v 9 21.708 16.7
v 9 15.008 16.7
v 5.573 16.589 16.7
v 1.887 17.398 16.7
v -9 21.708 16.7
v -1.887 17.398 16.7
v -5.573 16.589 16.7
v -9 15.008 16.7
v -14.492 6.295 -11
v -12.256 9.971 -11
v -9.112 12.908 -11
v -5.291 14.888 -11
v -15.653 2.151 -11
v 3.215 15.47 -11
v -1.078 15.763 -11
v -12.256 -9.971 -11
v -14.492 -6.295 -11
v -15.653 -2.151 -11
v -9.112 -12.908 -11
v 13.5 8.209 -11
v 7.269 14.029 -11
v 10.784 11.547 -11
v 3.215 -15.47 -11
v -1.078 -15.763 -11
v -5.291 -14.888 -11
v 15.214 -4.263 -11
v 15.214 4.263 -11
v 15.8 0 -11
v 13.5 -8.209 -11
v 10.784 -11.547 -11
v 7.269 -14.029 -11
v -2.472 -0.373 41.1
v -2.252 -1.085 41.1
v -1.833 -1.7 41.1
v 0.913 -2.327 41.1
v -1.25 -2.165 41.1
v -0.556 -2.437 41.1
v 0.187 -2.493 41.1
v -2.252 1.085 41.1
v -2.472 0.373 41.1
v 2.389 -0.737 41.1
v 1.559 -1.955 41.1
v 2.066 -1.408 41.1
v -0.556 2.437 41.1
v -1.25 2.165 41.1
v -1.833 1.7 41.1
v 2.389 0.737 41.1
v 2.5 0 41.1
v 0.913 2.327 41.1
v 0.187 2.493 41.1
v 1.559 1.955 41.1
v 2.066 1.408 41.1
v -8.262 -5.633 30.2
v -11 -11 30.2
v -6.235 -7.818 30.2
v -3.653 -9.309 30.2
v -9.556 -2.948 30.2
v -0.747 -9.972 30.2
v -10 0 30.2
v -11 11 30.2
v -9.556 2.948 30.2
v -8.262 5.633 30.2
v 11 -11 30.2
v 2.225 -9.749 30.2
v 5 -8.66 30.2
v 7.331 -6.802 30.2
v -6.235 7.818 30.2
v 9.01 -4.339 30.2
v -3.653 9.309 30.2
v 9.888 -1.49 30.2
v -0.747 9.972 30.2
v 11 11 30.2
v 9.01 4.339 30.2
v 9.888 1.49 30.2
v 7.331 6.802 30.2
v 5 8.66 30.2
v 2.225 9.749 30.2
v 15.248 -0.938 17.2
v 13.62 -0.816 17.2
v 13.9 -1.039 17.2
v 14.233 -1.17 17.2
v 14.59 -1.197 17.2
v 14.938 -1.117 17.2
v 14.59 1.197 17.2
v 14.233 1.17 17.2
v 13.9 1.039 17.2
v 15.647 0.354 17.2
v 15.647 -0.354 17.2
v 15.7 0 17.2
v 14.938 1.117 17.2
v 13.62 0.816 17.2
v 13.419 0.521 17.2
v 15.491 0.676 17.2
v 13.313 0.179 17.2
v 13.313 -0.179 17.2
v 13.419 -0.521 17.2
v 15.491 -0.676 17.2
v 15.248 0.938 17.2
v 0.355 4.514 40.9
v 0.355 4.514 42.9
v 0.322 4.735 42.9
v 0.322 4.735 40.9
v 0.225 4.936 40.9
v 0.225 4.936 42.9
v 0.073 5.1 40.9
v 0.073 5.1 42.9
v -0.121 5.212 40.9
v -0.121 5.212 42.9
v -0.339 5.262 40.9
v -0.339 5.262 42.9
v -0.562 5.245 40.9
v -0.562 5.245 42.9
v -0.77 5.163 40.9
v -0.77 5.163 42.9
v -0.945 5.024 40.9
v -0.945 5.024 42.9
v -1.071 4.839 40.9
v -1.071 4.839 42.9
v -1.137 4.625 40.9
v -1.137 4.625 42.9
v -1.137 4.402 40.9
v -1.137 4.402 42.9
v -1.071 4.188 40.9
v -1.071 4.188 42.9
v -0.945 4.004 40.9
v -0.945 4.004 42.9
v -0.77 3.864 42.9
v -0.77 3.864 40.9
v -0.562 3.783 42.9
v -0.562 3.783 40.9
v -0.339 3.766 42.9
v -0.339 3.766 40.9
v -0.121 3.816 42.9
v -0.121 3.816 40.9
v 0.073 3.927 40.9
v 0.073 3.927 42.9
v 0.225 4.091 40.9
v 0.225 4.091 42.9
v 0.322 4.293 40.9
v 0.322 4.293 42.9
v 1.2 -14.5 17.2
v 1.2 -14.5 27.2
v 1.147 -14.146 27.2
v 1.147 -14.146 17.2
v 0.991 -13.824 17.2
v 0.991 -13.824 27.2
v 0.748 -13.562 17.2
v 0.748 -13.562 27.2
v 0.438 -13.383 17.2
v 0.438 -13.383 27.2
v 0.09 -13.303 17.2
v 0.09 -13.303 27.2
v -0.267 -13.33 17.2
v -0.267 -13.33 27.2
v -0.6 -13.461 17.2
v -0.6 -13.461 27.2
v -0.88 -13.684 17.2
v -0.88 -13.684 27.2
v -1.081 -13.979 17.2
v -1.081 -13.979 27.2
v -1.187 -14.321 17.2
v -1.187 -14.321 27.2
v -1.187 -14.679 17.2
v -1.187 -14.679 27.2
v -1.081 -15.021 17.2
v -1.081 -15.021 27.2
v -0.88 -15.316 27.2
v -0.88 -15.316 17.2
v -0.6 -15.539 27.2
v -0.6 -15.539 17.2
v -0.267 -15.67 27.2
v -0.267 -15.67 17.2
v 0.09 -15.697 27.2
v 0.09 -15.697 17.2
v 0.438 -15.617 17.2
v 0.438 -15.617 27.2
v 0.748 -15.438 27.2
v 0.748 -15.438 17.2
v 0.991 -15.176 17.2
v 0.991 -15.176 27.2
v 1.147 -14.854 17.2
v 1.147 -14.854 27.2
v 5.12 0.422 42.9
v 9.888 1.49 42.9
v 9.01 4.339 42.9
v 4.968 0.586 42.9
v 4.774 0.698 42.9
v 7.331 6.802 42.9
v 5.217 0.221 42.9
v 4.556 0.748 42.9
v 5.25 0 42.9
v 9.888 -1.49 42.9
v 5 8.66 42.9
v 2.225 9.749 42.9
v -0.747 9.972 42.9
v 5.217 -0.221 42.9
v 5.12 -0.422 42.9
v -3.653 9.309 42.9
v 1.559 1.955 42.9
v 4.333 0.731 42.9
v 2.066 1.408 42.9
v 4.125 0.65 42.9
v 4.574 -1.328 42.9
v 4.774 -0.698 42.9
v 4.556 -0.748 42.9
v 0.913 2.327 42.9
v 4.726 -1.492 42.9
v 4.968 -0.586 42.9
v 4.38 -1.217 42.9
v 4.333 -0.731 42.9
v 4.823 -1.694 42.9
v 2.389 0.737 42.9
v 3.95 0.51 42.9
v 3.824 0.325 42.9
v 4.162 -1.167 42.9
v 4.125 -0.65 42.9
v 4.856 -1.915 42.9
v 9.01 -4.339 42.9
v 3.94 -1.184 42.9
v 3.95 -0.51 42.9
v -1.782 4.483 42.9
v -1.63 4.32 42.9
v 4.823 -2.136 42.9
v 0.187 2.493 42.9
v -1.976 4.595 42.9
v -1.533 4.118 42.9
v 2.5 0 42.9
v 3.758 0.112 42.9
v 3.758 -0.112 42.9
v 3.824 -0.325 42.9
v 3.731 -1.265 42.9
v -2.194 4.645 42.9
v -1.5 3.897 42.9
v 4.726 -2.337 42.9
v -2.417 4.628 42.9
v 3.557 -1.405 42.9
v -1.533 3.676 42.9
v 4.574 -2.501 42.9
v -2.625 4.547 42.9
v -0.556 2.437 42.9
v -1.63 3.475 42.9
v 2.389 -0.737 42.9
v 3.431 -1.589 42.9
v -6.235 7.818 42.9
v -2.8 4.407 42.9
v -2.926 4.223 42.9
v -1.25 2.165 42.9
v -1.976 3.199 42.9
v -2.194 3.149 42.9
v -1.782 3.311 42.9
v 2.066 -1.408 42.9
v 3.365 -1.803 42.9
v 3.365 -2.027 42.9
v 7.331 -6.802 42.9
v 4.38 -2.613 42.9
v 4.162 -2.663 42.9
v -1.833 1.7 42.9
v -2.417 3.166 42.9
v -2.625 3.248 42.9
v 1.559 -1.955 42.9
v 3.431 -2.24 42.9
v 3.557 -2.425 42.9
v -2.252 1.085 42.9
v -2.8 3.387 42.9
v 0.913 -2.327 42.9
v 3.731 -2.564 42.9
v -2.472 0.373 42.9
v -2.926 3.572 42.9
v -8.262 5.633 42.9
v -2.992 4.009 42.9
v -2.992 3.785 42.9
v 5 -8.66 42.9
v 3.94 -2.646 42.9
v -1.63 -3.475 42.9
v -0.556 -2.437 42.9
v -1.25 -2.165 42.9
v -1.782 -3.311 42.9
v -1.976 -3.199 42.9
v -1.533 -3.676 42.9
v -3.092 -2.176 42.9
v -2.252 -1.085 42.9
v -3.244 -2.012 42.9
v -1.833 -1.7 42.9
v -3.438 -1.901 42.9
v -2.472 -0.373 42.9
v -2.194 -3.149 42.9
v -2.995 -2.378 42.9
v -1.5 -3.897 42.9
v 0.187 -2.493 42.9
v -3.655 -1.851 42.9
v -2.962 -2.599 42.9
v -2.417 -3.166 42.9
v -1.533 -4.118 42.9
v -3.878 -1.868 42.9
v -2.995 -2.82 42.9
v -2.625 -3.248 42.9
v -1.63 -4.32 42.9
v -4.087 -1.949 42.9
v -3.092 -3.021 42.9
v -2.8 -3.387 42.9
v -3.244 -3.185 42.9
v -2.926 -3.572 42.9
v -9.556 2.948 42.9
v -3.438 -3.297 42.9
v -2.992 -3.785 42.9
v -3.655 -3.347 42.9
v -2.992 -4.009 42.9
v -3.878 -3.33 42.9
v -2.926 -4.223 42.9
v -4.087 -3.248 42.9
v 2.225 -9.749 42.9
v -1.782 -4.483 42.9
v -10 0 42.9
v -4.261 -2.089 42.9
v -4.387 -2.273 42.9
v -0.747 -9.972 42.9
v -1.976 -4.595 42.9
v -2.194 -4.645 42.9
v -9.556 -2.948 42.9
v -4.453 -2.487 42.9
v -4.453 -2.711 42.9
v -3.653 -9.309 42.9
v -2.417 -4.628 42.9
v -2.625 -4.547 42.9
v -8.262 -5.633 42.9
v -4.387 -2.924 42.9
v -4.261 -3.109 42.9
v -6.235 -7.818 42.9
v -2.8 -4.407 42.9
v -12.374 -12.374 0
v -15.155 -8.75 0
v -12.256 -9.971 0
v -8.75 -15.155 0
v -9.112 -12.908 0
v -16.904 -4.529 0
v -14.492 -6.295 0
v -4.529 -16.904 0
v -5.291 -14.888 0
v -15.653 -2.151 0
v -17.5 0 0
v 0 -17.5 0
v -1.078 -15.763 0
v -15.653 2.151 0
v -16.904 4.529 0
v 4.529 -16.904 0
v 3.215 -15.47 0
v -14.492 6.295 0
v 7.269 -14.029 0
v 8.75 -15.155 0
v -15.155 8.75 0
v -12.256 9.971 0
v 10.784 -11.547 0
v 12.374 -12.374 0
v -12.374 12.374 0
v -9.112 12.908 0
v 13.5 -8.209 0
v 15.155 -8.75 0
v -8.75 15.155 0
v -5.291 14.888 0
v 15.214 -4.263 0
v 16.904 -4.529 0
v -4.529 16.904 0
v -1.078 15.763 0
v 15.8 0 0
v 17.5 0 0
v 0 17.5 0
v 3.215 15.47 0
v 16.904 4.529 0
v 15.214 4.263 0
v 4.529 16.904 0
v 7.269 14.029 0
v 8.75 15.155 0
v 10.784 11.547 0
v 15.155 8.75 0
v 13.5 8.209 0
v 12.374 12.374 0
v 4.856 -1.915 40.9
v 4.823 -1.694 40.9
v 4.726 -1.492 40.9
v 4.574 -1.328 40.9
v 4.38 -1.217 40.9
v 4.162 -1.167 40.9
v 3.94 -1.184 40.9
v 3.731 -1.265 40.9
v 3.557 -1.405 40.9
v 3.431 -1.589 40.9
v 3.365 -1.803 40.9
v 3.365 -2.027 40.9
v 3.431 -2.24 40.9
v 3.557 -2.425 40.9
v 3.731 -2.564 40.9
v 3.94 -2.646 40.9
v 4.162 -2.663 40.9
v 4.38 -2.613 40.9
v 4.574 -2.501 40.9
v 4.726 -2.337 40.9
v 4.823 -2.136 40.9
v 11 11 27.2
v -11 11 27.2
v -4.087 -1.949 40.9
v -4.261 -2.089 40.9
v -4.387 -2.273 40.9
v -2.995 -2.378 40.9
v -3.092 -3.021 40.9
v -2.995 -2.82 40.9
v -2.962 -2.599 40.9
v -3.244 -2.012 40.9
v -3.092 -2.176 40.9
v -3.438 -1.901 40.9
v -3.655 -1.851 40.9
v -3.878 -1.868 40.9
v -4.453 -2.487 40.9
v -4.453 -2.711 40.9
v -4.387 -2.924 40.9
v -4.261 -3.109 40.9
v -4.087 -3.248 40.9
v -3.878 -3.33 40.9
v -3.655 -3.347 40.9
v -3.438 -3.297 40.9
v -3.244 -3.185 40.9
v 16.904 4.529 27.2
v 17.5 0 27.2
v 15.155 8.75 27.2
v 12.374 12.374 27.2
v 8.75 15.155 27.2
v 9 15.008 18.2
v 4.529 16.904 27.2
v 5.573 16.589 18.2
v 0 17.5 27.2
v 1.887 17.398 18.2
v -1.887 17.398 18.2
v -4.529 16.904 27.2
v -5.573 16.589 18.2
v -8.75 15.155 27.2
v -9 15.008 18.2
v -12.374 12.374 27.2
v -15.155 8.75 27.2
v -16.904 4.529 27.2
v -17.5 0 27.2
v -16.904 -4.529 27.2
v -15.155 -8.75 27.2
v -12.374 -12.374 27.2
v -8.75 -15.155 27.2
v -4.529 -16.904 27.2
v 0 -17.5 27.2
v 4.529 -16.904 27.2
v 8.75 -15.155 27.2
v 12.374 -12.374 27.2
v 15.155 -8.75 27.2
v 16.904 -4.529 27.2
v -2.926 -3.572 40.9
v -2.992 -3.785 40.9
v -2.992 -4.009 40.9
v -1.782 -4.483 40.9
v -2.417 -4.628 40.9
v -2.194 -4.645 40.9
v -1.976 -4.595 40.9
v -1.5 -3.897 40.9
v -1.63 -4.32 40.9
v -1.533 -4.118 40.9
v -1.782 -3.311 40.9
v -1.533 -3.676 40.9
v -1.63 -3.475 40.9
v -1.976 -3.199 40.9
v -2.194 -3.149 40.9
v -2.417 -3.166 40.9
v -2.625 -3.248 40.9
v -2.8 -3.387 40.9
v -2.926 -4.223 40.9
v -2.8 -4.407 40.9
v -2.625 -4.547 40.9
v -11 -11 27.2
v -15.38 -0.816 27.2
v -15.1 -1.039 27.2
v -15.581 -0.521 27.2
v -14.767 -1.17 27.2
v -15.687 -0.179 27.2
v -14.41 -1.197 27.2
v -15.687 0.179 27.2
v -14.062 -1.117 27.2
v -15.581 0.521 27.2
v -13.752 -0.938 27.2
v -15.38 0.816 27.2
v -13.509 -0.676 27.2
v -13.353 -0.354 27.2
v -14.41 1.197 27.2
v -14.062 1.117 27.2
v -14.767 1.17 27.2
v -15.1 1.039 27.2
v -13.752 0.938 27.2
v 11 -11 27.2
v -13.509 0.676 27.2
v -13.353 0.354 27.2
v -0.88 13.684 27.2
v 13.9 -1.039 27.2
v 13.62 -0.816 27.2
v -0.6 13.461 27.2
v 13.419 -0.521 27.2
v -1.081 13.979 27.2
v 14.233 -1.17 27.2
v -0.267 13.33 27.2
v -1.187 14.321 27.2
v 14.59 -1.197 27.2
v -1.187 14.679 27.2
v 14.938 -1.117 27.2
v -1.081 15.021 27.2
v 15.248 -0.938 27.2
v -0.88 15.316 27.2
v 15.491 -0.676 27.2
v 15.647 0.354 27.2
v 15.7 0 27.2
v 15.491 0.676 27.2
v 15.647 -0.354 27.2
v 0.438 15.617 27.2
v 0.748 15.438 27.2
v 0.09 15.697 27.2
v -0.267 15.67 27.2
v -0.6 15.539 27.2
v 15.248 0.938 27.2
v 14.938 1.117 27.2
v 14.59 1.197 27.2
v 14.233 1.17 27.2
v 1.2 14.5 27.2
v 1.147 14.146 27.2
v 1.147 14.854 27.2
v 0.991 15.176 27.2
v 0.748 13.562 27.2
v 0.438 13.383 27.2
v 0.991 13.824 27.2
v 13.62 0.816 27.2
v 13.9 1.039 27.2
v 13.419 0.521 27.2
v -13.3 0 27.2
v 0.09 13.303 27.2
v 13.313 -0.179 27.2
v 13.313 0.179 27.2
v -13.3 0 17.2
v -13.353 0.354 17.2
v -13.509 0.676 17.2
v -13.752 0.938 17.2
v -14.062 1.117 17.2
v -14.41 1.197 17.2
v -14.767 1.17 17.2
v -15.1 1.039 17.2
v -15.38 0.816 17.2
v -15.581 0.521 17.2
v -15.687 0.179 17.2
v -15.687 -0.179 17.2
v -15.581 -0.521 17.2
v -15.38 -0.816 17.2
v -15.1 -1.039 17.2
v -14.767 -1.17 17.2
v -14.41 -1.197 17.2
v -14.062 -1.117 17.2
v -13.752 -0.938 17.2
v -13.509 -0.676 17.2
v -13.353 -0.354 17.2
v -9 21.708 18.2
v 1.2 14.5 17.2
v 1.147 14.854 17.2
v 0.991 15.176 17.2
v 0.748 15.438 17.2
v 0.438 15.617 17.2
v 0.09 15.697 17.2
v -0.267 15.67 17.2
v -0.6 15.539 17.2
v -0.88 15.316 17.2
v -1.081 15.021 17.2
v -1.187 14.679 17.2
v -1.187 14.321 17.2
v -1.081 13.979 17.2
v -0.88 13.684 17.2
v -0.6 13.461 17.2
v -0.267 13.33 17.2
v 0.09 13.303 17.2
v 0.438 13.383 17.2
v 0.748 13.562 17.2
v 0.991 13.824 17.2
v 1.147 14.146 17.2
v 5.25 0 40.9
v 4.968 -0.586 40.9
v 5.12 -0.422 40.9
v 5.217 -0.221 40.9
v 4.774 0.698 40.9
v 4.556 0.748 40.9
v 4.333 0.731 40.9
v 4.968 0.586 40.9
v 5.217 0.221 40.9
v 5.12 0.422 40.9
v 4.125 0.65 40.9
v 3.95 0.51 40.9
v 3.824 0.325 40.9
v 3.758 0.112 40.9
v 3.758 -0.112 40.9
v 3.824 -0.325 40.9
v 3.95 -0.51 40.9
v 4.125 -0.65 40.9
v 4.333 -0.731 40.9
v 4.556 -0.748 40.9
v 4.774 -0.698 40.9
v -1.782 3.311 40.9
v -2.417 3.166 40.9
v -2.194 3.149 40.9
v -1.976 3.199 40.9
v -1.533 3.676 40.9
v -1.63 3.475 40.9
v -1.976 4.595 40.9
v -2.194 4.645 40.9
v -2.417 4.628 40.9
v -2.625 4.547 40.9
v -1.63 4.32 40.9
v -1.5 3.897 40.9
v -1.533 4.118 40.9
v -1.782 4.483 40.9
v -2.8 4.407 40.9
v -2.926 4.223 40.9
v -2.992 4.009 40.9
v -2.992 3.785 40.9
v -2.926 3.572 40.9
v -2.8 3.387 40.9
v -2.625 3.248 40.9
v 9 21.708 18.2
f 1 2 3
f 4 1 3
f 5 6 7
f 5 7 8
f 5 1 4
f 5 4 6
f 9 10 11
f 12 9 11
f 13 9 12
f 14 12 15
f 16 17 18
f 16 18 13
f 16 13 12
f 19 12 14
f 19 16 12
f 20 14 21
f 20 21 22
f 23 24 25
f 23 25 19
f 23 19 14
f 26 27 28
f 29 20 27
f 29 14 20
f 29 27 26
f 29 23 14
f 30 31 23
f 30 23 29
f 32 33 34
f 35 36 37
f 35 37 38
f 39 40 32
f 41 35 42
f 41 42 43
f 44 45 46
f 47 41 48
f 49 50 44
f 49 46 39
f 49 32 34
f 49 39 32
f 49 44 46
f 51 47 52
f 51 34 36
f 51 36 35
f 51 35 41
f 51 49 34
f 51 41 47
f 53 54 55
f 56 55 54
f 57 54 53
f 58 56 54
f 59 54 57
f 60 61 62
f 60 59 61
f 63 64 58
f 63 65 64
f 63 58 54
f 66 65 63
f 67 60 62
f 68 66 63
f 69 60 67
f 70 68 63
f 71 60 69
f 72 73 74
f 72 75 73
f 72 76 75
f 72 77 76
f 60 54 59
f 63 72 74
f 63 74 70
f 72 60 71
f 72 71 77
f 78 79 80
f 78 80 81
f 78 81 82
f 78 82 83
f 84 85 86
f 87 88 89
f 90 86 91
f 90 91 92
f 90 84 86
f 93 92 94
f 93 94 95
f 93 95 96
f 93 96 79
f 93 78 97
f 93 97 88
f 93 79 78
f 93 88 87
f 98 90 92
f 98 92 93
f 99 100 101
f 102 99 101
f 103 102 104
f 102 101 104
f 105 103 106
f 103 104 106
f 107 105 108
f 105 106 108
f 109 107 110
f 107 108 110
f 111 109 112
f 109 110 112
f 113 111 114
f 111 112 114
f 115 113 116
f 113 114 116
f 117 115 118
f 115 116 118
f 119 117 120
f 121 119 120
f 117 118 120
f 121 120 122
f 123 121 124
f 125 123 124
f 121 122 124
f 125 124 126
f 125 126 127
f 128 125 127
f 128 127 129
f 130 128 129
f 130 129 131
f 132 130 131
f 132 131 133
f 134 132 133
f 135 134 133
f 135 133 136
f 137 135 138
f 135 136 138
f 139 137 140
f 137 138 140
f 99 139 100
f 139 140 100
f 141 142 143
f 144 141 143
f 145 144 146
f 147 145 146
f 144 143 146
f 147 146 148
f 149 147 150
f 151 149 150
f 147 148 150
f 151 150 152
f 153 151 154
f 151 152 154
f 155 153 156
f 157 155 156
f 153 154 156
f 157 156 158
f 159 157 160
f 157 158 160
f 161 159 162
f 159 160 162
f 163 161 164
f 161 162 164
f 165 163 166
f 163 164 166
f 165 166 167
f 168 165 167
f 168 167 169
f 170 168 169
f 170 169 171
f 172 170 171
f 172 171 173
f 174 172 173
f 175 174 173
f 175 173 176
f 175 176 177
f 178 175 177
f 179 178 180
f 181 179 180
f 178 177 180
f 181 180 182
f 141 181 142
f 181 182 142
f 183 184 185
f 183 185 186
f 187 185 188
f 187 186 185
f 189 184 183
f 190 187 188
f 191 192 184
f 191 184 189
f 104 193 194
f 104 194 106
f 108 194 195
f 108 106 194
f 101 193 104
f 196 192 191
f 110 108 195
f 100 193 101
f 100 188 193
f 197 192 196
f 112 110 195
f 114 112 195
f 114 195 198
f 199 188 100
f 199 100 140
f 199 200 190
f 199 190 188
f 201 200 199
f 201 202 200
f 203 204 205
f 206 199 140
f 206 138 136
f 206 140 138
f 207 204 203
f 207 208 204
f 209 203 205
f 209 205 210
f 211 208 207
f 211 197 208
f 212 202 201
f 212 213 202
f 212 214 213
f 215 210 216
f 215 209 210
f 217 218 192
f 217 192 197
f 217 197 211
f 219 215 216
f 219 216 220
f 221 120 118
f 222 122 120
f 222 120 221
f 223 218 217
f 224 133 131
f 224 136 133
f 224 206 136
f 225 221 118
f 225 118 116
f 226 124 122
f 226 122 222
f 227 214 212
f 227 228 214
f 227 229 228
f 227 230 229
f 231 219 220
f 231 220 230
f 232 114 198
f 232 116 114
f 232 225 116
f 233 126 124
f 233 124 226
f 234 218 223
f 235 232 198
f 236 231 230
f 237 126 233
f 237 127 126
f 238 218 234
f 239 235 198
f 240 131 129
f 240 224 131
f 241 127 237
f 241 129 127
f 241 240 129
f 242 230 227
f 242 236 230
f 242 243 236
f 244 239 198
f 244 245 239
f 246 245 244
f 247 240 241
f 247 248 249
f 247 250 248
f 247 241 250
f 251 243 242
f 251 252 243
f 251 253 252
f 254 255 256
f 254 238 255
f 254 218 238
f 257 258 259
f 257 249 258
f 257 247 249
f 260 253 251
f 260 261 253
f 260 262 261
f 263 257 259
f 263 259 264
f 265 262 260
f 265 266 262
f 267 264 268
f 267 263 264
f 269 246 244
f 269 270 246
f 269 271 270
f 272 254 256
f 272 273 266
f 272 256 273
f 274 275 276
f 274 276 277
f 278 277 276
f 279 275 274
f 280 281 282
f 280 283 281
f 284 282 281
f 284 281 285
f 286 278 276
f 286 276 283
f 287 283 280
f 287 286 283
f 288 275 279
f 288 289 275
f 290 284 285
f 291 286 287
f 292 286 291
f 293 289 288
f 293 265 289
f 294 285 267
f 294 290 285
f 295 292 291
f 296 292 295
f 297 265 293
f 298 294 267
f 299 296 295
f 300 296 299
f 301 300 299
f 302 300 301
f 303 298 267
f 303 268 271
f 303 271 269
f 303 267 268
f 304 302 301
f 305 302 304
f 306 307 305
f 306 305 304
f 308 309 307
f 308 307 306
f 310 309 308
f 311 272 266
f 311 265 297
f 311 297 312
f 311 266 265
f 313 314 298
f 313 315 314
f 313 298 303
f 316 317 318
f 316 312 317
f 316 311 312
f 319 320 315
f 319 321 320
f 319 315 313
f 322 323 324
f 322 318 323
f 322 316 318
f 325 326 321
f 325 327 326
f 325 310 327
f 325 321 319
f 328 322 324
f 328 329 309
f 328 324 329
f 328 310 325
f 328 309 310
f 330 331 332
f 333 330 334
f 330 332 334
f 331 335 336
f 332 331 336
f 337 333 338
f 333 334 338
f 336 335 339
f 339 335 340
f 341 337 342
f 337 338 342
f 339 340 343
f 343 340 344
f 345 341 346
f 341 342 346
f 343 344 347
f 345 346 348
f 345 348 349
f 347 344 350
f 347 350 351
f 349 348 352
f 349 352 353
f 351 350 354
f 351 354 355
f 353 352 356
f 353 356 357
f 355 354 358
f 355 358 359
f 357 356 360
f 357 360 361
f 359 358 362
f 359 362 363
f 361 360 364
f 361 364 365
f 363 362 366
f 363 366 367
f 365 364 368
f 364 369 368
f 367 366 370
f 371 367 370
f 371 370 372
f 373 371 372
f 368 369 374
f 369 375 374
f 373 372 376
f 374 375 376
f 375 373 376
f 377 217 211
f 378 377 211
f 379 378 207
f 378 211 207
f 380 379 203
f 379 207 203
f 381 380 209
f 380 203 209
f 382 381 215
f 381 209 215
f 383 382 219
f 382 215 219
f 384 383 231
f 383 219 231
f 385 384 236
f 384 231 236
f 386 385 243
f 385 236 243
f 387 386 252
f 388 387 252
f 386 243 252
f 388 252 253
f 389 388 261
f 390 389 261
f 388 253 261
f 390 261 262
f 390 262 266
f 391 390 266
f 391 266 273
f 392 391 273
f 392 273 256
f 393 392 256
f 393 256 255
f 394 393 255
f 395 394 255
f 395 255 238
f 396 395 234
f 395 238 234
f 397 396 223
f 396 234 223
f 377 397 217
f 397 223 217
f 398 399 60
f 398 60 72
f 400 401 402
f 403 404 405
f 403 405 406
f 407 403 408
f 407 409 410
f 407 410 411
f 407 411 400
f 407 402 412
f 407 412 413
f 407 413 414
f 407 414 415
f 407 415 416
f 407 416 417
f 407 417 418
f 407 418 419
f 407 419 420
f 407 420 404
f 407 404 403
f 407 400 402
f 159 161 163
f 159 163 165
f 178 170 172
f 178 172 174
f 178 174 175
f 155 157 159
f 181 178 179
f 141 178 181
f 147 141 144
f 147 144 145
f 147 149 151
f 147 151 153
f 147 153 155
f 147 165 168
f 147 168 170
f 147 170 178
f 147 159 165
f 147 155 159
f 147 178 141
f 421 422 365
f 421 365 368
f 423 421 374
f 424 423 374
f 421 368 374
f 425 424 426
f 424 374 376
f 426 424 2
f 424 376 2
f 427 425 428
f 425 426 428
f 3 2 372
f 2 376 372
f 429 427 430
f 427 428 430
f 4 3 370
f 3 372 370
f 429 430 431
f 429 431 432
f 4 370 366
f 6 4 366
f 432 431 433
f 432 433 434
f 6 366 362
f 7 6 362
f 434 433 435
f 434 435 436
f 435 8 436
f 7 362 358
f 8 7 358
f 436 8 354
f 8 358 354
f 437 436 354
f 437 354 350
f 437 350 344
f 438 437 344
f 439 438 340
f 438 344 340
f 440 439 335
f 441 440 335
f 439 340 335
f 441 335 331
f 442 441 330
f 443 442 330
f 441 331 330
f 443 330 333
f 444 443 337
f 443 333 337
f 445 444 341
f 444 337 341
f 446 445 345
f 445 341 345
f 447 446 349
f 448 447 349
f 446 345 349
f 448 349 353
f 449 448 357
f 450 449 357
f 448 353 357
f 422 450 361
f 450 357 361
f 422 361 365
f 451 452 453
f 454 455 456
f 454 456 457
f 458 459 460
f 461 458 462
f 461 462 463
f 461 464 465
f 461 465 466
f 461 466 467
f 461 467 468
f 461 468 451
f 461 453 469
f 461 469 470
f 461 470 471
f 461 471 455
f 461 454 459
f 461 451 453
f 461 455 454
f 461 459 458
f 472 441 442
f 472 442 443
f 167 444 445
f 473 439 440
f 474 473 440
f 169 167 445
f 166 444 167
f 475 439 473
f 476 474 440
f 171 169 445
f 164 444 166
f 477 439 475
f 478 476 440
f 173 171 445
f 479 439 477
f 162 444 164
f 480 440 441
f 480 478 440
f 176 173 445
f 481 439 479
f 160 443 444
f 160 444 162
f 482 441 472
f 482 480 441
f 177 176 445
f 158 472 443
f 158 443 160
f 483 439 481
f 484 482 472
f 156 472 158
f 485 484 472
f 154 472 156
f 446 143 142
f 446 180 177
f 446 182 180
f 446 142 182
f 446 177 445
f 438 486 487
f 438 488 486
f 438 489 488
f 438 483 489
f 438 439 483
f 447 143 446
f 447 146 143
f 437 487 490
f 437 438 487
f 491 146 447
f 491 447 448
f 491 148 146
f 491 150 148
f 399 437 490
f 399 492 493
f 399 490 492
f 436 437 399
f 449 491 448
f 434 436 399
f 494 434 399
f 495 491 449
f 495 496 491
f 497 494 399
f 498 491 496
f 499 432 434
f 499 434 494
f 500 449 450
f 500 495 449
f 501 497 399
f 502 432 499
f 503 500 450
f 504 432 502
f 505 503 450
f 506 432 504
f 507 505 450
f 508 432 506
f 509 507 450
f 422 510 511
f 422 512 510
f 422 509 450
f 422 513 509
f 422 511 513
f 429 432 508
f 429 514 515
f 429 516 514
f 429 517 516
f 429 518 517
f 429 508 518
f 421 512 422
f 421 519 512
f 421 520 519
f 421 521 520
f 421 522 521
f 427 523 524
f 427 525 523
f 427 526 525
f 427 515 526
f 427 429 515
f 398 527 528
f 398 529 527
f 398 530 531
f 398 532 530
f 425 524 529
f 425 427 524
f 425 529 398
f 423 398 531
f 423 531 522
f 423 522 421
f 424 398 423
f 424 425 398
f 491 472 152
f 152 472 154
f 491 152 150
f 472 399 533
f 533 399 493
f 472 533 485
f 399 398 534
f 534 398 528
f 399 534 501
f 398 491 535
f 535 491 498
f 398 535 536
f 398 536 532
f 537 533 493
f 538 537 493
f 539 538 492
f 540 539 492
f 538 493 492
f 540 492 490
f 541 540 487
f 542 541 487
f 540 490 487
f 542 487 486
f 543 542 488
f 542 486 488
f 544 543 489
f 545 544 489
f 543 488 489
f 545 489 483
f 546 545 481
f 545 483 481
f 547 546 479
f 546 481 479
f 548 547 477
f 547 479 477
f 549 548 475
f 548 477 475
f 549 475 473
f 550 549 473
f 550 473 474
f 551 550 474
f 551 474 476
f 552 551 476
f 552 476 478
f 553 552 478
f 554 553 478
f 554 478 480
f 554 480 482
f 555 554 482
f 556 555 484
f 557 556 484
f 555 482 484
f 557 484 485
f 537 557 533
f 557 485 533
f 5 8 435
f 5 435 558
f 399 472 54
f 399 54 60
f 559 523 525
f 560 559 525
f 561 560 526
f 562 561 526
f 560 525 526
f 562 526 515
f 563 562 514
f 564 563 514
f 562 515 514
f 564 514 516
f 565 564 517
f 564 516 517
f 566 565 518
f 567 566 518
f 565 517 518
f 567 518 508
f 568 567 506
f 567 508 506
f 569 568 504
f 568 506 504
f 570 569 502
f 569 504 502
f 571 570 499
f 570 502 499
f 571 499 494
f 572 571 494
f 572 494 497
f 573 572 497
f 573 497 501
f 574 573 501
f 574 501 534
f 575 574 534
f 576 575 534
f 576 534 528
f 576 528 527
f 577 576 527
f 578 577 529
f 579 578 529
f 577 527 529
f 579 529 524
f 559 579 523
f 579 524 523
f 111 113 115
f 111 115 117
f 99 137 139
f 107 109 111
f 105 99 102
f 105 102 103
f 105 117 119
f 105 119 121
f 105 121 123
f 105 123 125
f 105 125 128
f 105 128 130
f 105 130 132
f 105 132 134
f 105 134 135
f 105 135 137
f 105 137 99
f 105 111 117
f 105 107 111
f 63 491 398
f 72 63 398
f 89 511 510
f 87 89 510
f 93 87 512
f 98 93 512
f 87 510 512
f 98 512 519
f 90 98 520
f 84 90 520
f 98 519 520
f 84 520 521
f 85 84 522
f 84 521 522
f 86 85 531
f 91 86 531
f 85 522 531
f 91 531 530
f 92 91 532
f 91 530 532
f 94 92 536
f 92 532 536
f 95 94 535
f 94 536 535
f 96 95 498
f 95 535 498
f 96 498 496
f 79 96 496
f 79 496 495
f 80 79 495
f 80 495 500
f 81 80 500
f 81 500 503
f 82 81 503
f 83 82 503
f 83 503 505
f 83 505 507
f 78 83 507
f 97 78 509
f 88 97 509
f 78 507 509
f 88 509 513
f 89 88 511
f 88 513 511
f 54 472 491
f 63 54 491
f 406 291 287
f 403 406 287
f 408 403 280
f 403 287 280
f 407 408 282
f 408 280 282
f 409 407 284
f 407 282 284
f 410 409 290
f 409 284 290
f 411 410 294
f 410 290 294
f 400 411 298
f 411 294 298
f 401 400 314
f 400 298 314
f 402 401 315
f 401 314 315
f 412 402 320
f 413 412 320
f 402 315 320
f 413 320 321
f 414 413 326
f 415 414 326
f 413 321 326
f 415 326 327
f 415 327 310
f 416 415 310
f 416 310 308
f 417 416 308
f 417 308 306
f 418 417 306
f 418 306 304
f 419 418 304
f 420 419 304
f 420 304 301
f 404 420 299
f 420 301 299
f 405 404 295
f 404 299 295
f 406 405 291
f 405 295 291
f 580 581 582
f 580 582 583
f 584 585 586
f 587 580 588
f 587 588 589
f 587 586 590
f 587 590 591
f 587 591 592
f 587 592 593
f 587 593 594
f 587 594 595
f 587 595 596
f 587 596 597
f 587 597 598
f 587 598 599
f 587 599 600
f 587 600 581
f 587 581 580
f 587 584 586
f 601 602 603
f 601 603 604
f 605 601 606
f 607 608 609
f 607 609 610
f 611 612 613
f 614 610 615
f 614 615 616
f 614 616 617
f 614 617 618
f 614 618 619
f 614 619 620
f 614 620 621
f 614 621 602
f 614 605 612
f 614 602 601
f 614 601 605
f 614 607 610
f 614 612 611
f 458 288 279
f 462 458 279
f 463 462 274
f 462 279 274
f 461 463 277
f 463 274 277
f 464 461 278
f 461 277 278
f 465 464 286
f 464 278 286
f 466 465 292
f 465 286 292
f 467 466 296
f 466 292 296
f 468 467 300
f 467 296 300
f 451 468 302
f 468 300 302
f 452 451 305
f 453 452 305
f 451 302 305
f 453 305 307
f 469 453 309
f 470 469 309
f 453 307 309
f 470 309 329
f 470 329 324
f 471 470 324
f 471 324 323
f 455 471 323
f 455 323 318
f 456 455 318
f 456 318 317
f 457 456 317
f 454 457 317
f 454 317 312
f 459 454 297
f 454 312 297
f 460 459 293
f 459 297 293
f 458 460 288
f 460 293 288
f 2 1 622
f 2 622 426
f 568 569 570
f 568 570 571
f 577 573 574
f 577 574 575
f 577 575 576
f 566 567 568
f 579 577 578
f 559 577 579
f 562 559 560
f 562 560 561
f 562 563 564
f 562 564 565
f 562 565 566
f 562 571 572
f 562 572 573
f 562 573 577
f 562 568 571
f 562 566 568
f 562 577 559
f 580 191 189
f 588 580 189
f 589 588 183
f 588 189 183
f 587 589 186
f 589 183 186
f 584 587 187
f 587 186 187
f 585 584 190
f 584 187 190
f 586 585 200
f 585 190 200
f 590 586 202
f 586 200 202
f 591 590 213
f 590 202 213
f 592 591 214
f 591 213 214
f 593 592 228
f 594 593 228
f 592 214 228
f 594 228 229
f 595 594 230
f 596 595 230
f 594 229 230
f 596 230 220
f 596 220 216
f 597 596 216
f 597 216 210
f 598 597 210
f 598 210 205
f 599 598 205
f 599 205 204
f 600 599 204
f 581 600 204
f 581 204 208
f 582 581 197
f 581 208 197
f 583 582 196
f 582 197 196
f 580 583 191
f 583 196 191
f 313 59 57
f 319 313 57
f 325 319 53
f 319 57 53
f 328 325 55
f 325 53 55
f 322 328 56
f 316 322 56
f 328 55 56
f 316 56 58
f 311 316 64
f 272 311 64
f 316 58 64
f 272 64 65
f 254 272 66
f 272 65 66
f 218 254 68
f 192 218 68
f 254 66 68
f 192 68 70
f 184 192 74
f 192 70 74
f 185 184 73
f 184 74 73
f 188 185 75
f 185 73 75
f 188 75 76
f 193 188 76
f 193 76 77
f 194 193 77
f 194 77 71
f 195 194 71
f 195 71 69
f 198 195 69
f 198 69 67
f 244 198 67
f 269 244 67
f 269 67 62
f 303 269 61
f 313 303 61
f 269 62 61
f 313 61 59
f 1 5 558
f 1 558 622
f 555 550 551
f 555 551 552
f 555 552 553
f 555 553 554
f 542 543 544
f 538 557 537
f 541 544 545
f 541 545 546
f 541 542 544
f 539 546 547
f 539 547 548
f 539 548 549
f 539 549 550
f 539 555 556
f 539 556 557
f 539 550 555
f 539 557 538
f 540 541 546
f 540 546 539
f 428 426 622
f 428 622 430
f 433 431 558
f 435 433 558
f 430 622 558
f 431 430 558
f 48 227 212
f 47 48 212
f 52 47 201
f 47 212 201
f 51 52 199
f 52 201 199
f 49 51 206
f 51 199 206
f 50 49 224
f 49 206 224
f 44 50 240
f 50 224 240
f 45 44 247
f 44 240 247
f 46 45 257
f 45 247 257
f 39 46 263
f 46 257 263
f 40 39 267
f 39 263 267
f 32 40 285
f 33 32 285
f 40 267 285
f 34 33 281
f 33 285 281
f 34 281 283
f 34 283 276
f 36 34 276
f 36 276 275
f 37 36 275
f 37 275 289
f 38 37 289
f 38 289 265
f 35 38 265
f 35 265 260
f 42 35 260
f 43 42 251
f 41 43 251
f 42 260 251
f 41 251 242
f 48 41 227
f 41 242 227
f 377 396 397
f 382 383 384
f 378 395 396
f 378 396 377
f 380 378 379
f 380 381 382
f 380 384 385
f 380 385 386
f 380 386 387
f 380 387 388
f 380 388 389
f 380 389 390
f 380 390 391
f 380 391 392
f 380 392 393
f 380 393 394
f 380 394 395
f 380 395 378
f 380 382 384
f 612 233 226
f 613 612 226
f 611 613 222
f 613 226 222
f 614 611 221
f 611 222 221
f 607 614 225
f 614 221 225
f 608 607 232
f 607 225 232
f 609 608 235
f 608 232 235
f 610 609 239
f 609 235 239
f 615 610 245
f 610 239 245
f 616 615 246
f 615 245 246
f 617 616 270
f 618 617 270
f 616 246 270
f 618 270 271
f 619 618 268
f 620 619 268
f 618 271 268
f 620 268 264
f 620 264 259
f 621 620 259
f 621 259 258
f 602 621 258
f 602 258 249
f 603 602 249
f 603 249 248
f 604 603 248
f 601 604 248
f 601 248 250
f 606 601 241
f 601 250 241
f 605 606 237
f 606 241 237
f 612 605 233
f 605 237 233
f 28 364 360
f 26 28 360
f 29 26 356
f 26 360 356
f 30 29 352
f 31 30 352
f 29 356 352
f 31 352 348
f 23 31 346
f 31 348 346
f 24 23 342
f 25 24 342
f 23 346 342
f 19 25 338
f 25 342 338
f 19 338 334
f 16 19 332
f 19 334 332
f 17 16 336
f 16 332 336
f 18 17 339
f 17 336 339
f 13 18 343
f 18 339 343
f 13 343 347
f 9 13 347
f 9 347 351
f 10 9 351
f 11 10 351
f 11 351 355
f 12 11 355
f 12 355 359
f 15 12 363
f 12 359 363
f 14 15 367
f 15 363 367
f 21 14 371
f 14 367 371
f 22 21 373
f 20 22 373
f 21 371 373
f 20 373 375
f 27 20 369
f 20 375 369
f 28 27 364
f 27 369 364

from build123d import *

# Parameters (mm, degrees)
SKETCH_1_R          = 17.5
EXTRUDE_1_DEPTH     = 27.2
SKETCH_2_R          = 15.8
EXTRUDE_2_DEPTH     = 11
SKETCH_3_W          = 22
SKETCH_3_H          = 22
EXTRUDE_3_DEPTH     = 3
SKETCH_4_R          = 10
EXTRUDE_4_DEPTH     = 12.7
SKETCH_5_R          = 1.2
CUT_EXTRUDE_1_DEPTH = 10
EXTRUDE_START       = -1.5
EXTRUDE_5_DEPTH     = 1.5
SKETCH_8_R          = 2.5
CUT_EXTRUDE_2_DEPTH = 1.8
SKETCH_9_R          = 0.75
CUT_EXTRUDE_3_DEPTH = 2


with BuildPart() as part:
    # 草图1 → 凸台-拉伸1 (new body)
    with BuildSketch(Plane.XY):
        Circle(SKETCH_1_R)
    extrude(amount=EXTRUDE_1_DEPTH)

    # 草图2 → 凸台-拉伸2 (add)
    with BuildSketch(Plane(origin=(0, 0, 0), x_dir=(-1, 0, 0), z_dir=(0, 0, -1))):
        with Locations(Location((0, 0, 0), (0, 0, 180))):
            Circle(SKETCH_2_R)
    extrude(amount=EXTRUDE_2_DEPTH)

    # 草图3 → 凸台-拉伸3 (add)
    with BuildSketch(Plane.XY.offset(27.2)):
        Rectangle(SKETCH_3_W, SKETCH_3_H)
    extrude(amount=EXTRUDE_3_DEPTH)

    # 草图4 → 凸台-拉伸4 (add)
    with BuildSketch(Plane.XY.offset(30.2)):
        with Locations(Location((0, 0, 0), (0, 0, 180))):
            Circle(SKETCH_4_R)
    extrude(amount=EXTRUDE_4_DEPTH)

    # 草图5 → 切除-拉伸1 (cut)
    with BuildSketch(Plane.XY.offset(27.2)):
        with Locations((0, -14.5)):
            Circle(SKETCH_5_R)
        with Locations((-14.5, 0)):
            Circle(SKETCH_5_R)
        with Locations((0, 14.5)):
            Circle(SKETCH_5_R)
        with Locations((14.5, 0)):
            Circle(SKETCH_5_R)
    extrude(amount=-CUT_EXTRUDE_1_DEPTH, mode=Mode.SUBTRACT)

    # 草图6 → 凸台-拉伸5 (add)
    with BuildSketch(Plane.XY.offset(18.2).offset(EXTRUDE_START)):
        with BuildLine():
            Line((-9, 15.00833102), (-9, 21.70833102))
            Line((-9, 21.70833102), (9, 21.70833102))
            Line((9, 21.70833102), (9, 15.00833102))
            ThreePointArc((9, 15.00833102), (0, 17.5), (-9, 15.00833102))
        make_face()
    extrude(amount=EXTRUDE_5_DEPTH)

    # 草图8 → 切除-拉伸2 (cut)
    with BuildSketch(Plane.XY.offset(42.9)):
        Circle(SKETCH_8_R)
    extrude(amount=-CUT_EXTRUDE_2_DEPTH, mode=Mode.SUBTRACT)

    # 草图9 → 切除-拉伸3 (cut)
    with BuildSketch(Plane.XY.offset(42.9)):
        with Locations((4.5, 0)):
            Circle(SKETCH_9_R)
        with Locations((4.106443914, -1.914866245)):
            Circle(SKETCH_9_R)
        with Locations((-2.25, -3.897114317)):
            Circle(SKETCH_9_R)
        with Locations((-3.71154477, -2.598851626)):
            Circle(SKETCH_9_R)
        with Locations((-2.25, 3.897114317)):
            Circle(SKETCH_9_R)
        with Locations((-0.394899144, 4.513717871)):
            Circle(SKETCH_9_R)
    extrude(amount=-CUT_EXTRUDE_3_DEPTH, mode=Mode.SUBTRACT)


solid = part.part
